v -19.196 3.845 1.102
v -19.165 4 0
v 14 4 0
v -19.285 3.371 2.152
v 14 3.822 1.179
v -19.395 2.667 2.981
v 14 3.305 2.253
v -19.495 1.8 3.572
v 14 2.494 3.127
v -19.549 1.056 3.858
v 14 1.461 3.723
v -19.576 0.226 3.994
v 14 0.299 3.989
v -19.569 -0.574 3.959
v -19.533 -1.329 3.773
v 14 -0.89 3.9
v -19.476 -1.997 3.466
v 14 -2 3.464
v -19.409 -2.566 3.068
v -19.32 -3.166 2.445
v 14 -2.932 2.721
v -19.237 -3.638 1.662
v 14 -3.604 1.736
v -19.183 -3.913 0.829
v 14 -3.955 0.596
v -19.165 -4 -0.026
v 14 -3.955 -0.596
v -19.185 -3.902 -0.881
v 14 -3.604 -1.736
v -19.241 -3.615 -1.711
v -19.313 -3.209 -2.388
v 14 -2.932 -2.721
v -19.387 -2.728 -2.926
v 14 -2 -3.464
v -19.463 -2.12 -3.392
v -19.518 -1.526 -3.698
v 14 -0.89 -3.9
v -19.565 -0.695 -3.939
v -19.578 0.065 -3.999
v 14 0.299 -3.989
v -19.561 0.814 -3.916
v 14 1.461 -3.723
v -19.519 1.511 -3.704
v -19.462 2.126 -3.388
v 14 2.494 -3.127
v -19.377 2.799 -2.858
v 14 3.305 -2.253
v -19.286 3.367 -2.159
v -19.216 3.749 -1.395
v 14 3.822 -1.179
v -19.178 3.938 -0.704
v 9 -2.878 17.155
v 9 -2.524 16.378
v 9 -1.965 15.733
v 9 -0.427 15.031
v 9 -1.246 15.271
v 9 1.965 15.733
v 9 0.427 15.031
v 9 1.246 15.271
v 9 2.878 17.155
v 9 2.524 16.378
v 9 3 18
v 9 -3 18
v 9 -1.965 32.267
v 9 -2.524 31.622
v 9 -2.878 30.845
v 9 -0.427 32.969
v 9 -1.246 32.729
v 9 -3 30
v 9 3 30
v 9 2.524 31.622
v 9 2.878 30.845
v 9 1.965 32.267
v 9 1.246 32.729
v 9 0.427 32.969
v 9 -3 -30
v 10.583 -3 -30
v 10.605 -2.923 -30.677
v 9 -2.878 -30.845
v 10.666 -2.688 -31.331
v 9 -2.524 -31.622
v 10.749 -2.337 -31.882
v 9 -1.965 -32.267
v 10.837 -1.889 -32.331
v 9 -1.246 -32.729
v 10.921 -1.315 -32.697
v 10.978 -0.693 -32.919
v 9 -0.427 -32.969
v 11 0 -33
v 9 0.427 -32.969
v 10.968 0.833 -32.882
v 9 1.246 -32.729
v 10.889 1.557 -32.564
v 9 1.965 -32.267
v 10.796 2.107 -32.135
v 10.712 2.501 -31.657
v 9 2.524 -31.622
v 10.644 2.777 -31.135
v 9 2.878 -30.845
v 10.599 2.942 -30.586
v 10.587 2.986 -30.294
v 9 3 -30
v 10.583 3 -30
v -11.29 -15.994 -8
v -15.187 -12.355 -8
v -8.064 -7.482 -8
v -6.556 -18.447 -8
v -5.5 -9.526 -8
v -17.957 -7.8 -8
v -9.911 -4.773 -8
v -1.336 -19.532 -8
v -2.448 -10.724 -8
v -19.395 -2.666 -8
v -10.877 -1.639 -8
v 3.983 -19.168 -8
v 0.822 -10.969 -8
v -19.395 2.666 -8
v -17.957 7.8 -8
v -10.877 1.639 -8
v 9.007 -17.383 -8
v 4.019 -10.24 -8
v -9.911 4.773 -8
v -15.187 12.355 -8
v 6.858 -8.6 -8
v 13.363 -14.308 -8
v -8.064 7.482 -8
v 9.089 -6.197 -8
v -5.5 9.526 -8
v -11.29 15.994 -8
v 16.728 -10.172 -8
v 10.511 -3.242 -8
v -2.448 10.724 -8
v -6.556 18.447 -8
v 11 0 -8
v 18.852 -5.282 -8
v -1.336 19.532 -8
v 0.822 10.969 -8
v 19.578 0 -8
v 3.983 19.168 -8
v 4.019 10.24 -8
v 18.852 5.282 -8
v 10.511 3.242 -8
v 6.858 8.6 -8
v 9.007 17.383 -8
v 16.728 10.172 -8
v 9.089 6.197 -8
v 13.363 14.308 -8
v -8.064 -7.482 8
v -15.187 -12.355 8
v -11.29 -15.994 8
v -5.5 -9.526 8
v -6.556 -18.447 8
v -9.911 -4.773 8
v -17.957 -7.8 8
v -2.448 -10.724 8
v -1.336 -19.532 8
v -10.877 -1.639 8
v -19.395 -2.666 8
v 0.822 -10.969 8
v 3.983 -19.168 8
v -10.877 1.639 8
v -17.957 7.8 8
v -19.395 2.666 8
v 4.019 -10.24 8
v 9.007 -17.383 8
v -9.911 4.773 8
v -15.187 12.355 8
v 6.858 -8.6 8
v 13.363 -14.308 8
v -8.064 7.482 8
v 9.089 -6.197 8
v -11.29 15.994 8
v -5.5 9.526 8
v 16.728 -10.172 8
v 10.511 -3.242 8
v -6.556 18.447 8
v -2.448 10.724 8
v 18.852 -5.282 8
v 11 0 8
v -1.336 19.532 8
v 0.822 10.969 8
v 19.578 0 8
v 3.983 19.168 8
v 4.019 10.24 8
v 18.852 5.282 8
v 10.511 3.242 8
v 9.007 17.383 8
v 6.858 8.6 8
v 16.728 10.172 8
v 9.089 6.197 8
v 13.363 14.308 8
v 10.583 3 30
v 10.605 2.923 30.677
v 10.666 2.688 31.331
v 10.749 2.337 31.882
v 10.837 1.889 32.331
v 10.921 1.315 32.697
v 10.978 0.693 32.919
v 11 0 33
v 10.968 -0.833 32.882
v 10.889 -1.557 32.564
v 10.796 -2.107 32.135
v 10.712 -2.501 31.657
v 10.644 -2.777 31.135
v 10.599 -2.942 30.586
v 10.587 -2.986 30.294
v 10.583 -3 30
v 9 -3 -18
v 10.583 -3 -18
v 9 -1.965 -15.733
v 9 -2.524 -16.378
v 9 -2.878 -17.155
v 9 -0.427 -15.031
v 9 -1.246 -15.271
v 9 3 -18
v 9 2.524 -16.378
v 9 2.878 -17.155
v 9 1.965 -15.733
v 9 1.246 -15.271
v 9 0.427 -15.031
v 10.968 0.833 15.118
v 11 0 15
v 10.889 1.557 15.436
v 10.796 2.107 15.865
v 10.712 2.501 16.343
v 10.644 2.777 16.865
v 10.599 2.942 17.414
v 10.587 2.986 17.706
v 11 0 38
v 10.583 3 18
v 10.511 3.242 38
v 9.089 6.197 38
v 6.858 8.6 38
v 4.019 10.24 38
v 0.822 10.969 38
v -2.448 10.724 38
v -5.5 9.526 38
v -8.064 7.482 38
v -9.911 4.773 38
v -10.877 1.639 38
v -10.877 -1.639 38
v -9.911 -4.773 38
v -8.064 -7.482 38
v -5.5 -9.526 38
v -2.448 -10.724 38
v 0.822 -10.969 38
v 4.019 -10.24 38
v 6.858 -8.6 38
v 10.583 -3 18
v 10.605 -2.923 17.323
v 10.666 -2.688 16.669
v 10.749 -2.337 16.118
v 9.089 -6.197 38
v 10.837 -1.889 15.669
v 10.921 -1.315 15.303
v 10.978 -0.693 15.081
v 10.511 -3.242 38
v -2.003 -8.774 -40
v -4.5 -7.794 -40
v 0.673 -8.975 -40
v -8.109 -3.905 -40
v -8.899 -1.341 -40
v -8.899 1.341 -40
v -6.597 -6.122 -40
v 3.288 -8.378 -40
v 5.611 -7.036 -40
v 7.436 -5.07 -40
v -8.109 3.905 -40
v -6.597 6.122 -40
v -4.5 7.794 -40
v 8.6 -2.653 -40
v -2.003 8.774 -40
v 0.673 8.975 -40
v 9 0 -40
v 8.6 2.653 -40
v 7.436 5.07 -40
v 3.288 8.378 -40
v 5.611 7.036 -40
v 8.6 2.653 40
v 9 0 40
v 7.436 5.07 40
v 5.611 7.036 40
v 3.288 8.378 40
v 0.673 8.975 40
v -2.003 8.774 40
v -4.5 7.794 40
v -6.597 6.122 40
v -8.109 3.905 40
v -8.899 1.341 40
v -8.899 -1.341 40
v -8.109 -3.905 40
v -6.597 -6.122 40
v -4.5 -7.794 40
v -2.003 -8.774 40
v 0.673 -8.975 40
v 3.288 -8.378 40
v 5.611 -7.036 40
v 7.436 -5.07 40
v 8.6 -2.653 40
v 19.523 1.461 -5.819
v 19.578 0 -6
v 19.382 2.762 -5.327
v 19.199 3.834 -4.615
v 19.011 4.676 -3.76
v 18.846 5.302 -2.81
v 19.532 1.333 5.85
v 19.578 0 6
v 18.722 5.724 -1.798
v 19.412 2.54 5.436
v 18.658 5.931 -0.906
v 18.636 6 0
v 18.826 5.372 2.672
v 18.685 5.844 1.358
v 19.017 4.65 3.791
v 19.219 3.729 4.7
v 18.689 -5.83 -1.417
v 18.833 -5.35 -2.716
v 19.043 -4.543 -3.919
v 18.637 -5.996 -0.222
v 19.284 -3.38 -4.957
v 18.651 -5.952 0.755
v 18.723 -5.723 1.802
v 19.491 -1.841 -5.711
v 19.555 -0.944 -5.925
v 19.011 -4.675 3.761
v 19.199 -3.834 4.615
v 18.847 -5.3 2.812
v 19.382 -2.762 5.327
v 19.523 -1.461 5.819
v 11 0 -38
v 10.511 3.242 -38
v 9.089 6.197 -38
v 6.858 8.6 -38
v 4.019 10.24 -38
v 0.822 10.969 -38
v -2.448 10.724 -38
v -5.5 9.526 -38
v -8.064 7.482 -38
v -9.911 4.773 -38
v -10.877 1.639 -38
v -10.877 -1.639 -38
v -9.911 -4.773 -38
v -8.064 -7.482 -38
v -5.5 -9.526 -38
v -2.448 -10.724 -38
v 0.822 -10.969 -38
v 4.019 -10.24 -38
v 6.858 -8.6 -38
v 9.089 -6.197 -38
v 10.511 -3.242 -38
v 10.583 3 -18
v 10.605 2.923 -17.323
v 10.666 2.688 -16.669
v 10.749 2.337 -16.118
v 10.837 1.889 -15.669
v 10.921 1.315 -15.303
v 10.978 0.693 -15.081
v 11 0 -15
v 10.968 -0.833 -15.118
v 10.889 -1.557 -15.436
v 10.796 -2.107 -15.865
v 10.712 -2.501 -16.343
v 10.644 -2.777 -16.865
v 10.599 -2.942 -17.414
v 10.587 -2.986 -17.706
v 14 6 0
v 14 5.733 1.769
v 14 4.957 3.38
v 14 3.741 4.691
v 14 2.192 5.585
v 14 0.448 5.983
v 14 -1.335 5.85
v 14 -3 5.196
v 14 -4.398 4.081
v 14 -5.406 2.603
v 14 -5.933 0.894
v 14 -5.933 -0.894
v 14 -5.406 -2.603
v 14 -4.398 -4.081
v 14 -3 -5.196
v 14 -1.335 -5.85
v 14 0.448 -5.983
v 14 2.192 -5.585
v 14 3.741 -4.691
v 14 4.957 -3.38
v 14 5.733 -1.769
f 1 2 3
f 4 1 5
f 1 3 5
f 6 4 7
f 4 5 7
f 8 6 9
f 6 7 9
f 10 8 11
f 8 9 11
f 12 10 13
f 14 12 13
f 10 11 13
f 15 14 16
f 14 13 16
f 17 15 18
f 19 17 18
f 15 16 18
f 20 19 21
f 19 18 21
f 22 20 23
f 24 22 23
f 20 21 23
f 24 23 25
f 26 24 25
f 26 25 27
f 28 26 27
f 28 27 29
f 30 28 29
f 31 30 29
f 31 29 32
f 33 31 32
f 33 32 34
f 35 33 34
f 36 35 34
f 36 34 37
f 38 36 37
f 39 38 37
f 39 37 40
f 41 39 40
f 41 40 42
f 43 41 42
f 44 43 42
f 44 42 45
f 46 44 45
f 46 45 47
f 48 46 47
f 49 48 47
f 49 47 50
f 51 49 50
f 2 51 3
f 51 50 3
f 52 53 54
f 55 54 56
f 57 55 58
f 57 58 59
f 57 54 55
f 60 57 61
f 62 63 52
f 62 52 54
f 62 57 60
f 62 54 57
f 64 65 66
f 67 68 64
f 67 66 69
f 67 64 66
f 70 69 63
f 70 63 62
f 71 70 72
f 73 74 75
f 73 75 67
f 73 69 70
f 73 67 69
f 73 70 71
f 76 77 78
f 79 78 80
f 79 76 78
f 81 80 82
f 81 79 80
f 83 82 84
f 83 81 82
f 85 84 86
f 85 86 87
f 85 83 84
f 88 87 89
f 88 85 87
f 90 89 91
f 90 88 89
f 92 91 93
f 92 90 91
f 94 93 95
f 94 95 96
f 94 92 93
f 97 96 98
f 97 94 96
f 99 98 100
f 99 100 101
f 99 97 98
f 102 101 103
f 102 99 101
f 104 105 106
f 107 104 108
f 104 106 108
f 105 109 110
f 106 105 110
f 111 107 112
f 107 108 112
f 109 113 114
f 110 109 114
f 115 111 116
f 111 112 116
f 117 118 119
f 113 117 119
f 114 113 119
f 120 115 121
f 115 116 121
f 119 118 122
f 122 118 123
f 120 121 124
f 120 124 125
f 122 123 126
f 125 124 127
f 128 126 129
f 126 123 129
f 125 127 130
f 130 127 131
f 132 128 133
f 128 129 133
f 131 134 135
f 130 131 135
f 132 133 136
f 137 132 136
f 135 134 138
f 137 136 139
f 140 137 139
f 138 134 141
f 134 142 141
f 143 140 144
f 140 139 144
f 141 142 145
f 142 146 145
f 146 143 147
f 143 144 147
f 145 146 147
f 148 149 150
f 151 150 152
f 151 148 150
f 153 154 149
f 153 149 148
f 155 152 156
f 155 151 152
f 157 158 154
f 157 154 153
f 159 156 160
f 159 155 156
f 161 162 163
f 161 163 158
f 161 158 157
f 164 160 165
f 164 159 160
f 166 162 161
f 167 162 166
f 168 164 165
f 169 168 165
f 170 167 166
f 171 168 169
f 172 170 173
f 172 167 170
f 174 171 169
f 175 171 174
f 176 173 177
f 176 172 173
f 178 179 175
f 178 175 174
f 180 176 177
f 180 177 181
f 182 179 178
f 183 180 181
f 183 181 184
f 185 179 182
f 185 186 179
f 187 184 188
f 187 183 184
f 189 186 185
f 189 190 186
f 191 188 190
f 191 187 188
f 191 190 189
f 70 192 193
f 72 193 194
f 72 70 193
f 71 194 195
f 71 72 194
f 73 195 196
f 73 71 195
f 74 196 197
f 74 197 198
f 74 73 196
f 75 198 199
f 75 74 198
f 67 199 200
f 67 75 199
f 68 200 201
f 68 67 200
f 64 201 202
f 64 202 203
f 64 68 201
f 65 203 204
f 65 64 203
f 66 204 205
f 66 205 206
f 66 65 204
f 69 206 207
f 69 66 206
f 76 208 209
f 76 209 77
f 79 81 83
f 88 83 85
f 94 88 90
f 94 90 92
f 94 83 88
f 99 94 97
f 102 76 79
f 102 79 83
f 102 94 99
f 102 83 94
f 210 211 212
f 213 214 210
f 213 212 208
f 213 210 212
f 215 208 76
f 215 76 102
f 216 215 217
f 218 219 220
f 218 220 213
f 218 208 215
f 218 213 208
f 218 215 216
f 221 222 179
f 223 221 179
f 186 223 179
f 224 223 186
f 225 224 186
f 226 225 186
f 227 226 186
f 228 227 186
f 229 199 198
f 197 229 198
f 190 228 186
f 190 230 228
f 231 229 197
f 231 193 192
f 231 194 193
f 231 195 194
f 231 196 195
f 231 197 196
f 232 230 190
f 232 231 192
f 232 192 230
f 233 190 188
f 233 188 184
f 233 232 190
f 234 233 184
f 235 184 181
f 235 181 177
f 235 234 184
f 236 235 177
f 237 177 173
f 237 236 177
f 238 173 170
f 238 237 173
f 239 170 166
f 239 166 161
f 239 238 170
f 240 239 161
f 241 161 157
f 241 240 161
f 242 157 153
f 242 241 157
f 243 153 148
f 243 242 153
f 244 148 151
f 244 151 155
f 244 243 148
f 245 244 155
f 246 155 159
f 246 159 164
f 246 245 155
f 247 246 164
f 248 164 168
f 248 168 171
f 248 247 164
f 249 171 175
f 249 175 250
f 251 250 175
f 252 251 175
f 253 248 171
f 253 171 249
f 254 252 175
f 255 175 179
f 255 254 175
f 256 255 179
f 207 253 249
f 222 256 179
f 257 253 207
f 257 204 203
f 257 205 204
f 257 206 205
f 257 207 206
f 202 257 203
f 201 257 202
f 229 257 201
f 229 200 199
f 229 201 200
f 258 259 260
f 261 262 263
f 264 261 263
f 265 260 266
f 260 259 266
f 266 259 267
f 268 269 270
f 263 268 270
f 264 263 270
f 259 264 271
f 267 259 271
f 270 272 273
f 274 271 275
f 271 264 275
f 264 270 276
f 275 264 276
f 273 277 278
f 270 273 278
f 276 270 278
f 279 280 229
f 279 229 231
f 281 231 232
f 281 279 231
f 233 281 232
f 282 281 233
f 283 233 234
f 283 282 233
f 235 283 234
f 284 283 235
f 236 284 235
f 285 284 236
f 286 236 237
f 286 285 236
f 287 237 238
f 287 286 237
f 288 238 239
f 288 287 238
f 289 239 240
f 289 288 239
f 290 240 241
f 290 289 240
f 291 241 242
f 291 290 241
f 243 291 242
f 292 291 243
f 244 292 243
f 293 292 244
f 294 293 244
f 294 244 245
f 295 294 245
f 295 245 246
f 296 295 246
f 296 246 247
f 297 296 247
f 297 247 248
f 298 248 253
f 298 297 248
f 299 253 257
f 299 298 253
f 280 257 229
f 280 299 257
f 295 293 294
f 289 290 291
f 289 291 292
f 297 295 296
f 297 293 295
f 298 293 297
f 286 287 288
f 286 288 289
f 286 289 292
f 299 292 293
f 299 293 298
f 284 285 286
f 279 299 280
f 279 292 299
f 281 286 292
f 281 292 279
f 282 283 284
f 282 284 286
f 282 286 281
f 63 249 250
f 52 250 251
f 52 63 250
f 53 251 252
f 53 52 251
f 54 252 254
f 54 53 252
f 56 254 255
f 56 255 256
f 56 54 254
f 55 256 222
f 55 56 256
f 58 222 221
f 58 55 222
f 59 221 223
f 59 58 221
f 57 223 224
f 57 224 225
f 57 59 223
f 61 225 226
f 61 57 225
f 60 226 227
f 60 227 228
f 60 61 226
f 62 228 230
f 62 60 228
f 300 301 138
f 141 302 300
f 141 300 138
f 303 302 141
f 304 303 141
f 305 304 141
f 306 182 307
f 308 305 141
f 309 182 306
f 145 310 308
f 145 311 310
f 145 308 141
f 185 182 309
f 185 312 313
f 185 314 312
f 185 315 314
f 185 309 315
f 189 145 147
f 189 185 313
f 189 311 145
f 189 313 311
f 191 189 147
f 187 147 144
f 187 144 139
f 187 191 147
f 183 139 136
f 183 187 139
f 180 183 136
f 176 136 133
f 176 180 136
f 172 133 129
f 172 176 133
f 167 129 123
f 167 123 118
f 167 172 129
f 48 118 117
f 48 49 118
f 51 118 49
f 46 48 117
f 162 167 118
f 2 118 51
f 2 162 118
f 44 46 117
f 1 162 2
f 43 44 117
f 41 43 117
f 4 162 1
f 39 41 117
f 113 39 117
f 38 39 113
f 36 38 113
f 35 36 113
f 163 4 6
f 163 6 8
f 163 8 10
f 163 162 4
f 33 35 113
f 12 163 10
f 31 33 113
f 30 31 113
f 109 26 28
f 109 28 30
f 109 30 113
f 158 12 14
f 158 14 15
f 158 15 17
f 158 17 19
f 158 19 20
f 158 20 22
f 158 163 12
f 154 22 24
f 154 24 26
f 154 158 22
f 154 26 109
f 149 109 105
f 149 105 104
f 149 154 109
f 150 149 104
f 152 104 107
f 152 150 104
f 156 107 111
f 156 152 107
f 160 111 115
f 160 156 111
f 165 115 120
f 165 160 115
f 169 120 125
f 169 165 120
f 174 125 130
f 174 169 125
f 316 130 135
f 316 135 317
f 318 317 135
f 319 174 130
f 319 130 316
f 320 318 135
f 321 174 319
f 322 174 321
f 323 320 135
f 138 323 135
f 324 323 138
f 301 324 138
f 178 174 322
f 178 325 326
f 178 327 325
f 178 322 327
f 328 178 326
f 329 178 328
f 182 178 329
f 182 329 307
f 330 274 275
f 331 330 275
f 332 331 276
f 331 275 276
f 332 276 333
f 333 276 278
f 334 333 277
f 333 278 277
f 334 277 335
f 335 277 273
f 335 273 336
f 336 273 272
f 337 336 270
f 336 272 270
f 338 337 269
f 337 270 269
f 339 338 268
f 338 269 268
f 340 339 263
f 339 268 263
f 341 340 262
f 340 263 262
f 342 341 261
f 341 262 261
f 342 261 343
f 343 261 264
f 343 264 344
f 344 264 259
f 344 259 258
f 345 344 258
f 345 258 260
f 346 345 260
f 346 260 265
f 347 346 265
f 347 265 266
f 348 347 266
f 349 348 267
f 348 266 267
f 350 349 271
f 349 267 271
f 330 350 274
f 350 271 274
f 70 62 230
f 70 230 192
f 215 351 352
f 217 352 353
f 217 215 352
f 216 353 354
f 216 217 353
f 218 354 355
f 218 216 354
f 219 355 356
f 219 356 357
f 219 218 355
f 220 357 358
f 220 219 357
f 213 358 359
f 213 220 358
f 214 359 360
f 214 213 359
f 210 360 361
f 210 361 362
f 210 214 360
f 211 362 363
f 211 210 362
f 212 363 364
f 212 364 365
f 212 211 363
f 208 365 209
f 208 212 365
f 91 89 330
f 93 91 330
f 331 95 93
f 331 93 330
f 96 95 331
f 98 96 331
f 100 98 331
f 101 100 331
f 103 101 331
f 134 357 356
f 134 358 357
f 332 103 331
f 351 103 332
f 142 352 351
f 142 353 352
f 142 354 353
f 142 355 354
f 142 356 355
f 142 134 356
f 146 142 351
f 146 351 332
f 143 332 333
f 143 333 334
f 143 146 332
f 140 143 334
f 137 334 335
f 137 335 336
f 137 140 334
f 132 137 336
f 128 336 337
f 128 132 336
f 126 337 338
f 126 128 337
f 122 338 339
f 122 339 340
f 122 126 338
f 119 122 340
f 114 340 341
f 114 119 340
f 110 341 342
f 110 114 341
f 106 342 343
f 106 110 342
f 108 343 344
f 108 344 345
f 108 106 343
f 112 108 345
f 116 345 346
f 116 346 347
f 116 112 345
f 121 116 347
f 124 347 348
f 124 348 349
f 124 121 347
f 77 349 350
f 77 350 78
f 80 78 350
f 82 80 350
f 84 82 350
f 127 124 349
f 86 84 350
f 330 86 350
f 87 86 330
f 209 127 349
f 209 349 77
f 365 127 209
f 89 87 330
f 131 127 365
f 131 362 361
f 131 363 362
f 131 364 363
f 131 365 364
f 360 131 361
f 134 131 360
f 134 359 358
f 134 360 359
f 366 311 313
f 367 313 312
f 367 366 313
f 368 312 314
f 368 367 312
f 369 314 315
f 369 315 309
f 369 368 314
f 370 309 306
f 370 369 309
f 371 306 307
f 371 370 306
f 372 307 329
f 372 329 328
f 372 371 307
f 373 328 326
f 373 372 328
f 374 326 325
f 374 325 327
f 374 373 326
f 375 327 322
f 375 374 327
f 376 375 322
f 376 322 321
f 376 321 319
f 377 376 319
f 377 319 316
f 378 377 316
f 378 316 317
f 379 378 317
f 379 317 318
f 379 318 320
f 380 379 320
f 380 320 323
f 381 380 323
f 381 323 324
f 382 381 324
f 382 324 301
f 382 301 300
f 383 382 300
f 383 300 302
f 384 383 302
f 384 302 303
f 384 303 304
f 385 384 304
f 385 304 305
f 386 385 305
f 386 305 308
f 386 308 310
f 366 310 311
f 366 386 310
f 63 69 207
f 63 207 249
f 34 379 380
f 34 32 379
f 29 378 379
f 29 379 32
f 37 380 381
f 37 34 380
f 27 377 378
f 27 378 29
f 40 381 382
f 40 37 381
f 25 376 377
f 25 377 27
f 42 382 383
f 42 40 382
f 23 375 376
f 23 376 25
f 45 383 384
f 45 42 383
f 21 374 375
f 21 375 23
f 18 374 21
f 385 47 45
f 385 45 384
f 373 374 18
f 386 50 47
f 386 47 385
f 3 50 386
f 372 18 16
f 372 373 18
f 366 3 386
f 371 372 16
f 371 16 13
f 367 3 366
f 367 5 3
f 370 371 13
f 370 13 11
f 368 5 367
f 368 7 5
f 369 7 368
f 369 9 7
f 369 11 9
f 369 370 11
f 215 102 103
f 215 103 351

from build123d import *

# Parameters (mm, degrees)
F0_R      = 11
F1_DEPTH  = 40
F3_SIZE   = 2
F4_SIZE   = 2
F5_R      = 19.577799
F6_DEPTH  = 8
F8_R      = 6
F9_DEPTH  = 30
F11_R     = 4
F12_DEPTH = 33.578799
F15_DEPTH = 10.578799
F17_DEPTH = 25


with BuildPart() as f1:
    # F0 (on Top) → F1 (new body, symmetric)
    with BuildSketch(Plane.XY):
        Circle(F0_R)
    extrude(amount=F1_DEPTH, both=True)

    # F3
    f3_edges = [f1.edges().sort_by_distance(p)[0] for p in [
        (-11, 0, 40),
    ]]
    chamfer(f3_edges, length=F3_SIZE)

    # F4
    f4_edges = [f1.edges().sort_by_distance(p)[0] for p in [
        (-11, 0, -40),
    ]]
    chamfer(f4_edges, length=F4_SIZE)

    # F5 (on Top) → F6 (join, symmetric)
    with BuildSketch(Plane.XY):
        Circle(F5_R)
    extrude(amount=F6_DEPTH, both=True)

    # F8 (on offset) → F9 (cut)
    with BuildSketch(Plane.YZ.offset(14)):
        Circle(F8_R)
    extrude(amount=F9_DEPTH, mode=Mode.SUBTRACT)

    # F11 (on offset) → F12 (cut, through all)
    with BuildSketch(Plane.YZ.offset(14)):
        Circle(F11_R)
    extrude(amount=-F12_DEPTH, mode=Mode.SUBTRACT)

    # F14 (on offset) → F15 (cut, through all)
    with BuildSketch(Plane.YZ.offset(9)):
        with BuildLine():
            Line((3, 18), (3, 30))
            ThreePointArc((3, 30), (0, 33), (-3, 30))
            Line((-3, 30), (-3, 18))
            ThreePointArc((-3, 18), (0, 15), (3, 18))
        make_face()
    extrude(amount=F15_DEPTH, mode=Mode.SUBTRACT)

    # F16 (on offset) → F17 (cut)
    with BuildSketch(Plane.YZ.offset(9)):
        with BuildLine():
            Line((-3, -18), (-3, -30))
            ThreePointArc((-3, -30), (0, -33), (3, -30))
            Line((3, -30), (3, -18))
            ThreePointArc((3, -18), (0, -15), (-3, -18))
        make_face()
    extrude(amount=F17_DEPTH, mode=Mode.SUBTRACT)


solid = f1.part
